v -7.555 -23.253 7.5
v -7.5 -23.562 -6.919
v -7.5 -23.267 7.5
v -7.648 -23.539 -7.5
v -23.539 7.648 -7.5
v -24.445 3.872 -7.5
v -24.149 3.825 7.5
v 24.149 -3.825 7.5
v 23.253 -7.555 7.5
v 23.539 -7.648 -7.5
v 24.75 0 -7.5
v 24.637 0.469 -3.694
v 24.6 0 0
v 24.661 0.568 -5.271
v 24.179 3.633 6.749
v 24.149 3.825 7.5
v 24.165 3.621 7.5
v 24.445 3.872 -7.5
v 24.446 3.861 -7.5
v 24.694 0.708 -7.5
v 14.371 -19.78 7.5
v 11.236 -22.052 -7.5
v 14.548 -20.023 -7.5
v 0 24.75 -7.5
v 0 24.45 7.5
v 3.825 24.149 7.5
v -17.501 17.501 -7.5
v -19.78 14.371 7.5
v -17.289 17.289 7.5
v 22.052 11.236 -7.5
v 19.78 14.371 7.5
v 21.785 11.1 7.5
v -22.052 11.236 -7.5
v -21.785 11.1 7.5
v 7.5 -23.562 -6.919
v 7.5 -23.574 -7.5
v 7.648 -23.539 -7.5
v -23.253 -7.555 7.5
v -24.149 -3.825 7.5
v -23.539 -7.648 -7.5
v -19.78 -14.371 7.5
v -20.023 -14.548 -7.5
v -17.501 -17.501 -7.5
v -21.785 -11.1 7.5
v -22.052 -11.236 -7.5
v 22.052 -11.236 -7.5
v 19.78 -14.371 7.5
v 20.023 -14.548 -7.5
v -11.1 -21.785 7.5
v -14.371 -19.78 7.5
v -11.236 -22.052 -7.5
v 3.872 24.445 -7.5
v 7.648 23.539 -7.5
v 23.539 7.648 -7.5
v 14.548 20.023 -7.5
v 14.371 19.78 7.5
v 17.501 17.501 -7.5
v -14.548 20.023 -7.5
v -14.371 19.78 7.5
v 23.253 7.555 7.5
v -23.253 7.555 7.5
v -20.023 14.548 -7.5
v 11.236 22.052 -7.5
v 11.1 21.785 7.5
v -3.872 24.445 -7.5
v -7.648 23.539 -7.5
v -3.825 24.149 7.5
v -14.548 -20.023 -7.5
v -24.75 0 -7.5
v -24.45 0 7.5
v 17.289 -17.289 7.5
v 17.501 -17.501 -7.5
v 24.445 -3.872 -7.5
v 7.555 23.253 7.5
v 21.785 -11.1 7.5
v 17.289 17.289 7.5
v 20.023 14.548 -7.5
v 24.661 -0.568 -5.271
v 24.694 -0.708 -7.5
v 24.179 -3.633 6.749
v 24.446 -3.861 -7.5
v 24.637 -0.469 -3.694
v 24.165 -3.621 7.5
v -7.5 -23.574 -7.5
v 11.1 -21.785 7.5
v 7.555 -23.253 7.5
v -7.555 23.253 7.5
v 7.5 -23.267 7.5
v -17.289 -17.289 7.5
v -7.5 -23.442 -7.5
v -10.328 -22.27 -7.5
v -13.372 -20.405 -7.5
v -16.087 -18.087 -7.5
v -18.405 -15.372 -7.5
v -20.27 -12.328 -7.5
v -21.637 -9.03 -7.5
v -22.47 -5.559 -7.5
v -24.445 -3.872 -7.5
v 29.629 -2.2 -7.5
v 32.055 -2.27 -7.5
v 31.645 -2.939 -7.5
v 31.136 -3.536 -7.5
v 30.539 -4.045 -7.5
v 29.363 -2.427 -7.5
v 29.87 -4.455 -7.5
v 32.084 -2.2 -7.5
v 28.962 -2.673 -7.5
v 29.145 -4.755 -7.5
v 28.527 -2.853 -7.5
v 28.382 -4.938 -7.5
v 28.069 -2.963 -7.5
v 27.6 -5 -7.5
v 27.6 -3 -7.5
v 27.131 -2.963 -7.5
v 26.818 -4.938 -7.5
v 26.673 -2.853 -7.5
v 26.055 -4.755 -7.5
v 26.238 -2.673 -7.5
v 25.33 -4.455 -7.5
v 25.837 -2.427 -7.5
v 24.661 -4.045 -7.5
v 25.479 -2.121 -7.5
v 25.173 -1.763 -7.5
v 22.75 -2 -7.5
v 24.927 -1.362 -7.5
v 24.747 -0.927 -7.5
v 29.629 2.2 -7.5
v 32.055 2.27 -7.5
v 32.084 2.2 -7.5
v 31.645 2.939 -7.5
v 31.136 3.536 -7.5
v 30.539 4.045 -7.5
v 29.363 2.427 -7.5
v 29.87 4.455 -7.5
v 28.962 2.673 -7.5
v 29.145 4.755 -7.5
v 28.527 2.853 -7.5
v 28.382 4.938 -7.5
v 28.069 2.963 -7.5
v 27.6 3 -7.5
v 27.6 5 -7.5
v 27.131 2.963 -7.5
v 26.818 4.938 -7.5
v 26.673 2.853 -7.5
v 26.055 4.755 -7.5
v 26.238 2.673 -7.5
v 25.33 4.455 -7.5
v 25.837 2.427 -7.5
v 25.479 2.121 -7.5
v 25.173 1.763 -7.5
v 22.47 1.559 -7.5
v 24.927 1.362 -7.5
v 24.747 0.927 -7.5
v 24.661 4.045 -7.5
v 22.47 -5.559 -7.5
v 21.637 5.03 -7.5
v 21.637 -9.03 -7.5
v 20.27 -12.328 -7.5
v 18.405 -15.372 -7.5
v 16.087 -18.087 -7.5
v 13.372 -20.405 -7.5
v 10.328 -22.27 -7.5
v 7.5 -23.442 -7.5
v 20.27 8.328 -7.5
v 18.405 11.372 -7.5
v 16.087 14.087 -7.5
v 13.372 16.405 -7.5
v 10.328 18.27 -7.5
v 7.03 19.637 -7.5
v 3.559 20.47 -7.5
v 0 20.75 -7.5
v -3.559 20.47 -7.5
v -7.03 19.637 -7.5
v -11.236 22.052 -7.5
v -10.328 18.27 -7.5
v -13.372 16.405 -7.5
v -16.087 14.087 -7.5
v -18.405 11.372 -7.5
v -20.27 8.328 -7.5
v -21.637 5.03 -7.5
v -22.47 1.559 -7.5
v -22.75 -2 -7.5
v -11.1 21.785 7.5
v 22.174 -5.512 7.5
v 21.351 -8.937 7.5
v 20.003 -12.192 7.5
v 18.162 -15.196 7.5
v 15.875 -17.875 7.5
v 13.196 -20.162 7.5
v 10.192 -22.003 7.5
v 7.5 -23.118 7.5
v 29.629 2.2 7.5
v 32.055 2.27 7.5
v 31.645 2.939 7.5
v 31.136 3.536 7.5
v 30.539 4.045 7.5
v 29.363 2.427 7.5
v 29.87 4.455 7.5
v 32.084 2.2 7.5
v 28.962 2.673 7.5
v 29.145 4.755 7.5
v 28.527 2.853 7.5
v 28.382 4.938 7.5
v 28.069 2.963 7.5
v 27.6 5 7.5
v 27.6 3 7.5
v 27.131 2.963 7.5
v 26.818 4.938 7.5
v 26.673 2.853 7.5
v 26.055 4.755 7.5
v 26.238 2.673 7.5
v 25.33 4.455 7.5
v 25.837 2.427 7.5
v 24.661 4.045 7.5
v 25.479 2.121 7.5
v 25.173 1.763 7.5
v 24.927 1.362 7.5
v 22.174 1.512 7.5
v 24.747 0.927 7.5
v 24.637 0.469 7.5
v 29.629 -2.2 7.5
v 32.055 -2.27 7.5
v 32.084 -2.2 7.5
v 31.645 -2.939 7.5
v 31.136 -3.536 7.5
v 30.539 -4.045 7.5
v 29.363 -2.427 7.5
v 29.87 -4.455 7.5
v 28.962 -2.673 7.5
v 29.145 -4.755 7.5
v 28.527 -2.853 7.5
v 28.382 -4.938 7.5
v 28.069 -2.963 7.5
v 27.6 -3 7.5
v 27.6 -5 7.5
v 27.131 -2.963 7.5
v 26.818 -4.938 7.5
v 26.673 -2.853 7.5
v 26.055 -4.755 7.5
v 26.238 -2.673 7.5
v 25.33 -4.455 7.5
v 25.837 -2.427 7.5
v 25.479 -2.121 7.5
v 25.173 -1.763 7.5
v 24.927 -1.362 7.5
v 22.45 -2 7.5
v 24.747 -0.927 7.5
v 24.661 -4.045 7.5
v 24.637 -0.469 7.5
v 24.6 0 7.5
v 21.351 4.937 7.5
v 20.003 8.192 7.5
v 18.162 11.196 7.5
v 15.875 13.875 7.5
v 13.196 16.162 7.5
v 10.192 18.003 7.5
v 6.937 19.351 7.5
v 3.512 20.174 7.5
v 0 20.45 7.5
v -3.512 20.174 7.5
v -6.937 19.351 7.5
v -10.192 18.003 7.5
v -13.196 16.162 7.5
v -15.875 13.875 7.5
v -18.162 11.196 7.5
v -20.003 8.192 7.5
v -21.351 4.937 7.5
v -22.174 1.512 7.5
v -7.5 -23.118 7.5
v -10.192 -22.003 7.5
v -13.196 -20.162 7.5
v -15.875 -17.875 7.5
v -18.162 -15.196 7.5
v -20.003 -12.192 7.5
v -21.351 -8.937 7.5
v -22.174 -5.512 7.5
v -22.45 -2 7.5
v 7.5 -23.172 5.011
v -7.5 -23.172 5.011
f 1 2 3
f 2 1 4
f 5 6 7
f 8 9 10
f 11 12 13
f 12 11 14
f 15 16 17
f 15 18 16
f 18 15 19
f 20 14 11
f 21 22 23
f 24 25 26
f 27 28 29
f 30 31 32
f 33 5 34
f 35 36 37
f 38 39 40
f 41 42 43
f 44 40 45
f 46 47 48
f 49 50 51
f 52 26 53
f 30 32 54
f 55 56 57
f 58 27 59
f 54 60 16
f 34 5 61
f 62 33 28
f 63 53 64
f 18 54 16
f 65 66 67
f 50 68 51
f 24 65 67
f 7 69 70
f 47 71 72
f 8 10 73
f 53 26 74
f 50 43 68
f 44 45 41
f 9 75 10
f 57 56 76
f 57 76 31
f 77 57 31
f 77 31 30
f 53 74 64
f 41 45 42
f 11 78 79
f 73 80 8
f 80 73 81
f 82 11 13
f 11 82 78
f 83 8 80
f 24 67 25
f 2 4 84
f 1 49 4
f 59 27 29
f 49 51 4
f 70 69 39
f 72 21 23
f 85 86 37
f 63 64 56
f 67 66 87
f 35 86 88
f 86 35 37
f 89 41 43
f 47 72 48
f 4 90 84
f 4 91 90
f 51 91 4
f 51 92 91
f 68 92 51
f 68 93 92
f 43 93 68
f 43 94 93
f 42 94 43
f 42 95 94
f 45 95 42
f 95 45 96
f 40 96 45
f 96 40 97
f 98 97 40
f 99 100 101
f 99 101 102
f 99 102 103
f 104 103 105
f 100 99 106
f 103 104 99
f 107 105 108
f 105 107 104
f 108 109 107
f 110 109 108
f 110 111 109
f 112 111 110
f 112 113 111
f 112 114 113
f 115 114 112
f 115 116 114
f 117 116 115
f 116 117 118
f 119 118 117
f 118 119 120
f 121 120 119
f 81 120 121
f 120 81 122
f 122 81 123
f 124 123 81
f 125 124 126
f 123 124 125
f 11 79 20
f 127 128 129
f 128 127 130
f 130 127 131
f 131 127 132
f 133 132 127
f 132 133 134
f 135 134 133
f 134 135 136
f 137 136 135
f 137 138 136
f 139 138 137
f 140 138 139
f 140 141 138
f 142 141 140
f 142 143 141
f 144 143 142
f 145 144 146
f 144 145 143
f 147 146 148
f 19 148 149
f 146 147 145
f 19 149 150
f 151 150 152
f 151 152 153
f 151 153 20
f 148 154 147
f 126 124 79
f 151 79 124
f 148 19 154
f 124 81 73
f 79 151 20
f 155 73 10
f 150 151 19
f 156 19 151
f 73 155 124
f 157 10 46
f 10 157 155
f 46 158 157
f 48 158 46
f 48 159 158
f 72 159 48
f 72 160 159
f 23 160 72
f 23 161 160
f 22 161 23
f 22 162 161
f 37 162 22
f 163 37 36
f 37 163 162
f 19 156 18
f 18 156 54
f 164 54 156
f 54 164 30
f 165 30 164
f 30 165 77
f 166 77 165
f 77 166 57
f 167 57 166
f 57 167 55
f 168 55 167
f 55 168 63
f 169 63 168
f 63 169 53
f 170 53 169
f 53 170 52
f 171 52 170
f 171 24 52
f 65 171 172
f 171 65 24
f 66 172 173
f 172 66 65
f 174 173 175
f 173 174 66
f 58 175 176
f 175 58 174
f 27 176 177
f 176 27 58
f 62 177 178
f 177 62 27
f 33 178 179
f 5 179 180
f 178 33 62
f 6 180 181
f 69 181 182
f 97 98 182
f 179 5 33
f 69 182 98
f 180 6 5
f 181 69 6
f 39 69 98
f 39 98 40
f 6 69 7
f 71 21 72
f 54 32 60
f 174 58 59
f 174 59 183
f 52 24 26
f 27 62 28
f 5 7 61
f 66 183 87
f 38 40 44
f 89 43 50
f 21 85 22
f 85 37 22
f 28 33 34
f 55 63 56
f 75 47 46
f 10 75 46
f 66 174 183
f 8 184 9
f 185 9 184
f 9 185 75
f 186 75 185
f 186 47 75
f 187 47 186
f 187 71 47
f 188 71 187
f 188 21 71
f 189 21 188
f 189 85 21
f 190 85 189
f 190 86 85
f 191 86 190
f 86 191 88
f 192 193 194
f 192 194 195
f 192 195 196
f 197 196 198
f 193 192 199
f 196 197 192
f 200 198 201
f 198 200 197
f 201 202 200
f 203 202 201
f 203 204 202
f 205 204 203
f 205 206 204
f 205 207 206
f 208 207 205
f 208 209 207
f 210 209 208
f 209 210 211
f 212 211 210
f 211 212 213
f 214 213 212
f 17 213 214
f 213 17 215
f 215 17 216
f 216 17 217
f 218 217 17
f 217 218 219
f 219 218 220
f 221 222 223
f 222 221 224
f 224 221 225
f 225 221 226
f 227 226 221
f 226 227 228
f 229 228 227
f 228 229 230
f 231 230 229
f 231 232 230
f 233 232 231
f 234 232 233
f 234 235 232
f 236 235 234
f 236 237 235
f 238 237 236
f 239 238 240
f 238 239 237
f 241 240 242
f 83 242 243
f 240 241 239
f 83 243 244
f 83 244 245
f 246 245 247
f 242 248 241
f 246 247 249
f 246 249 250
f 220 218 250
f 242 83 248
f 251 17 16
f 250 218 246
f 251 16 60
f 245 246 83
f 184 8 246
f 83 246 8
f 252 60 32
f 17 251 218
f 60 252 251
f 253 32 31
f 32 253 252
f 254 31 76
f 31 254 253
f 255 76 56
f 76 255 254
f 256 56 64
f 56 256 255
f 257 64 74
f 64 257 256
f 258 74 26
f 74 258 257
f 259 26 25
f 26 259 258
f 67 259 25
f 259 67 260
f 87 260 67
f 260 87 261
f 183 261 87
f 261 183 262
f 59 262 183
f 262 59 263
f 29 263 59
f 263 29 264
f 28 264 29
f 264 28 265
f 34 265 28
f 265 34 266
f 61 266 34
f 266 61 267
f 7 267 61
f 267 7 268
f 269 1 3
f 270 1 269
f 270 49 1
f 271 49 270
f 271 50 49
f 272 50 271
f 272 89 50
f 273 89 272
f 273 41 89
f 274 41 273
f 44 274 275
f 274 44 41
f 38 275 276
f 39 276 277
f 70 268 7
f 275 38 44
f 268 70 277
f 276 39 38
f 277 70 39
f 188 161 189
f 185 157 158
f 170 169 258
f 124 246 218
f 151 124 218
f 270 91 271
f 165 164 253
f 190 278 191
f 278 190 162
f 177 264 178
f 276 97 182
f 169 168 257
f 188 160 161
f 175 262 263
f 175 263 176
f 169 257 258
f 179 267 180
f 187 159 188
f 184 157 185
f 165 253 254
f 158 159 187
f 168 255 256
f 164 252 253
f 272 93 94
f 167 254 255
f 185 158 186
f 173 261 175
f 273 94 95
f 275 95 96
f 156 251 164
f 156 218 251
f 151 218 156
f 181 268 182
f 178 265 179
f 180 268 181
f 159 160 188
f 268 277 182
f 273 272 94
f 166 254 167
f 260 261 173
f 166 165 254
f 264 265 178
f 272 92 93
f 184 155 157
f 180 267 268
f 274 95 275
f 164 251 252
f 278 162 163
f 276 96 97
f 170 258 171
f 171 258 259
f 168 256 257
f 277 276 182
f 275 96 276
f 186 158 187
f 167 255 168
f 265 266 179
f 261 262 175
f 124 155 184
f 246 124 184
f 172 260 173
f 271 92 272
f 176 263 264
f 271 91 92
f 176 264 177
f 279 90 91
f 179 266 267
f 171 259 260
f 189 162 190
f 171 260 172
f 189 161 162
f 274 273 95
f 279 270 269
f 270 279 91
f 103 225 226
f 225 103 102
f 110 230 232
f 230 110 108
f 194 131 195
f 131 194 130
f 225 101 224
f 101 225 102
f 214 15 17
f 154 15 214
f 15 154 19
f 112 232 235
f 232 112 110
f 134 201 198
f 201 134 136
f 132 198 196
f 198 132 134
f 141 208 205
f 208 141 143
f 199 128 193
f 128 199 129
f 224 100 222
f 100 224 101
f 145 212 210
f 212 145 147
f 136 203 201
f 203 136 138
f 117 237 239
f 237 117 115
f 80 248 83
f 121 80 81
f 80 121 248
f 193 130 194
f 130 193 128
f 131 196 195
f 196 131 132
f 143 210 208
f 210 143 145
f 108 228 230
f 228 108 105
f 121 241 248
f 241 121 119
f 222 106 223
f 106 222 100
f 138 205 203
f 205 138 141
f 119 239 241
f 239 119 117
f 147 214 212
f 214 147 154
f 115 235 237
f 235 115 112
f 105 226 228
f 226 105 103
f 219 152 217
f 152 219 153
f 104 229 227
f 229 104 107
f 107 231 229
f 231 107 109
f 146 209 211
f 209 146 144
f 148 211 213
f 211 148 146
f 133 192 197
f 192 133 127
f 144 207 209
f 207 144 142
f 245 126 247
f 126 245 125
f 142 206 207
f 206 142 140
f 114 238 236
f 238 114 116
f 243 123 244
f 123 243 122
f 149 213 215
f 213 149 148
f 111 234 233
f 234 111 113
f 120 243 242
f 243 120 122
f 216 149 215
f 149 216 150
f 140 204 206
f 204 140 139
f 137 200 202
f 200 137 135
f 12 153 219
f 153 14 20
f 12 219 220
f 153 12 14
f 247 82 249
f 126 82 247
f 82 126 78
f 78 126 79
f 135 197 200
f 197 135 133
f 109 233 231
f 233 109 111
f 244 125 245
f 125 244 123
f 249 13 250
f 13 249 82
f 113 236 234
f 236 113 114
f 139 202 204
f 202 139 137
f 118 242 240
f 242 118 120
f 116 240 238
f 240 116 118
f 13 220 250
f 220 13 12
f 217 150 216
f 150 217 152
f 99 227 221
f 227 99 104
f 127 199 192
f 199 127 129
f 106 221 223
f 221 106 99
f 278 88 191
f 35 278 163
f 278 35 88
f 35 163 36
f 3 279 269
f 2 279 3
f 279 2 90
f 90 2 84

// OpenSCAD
e=4; // epaisseur

/*
// flute soprano Yamaha
de2=19.4;// diamètre flute bas
de1=19.6; // diamètre flute haut
de=(de1+de2)/2;
he=12; // largeur pince
da_trou = 0 ;// angle rotation trou
l_ouevrture_pince=10;
*/

/*
// flute alto aulos
de2=25.6;// diamètre flute bas
de1=25.8; // diamètre flute haut
de=(de1+de2)/2;
he=15; // largeur pince
da_trou = 0;  // angle rotation trou
l_ouevrture_pince=10;
*/

/*
// flute tenor aulos
de2=39.6;// diamètre flute bas
de1=38.3; // diamètre flute haut
de=(de1+de2)/2;
he=15; // largeur pince
da_trou = 0;  // angle rotation trou
l_ouevrture_pince=10;
*/

// flute basse aulos
de2=44.9;// diamètre flute bas
de1=45.5; // diamètre flute haut
de=(de1+de2)/2;
he=15; // largeur pince
da_trou = 0;  // angle rotation trou
l_ouevrture_pince=15;

dmicro=6;
douverture=dmicro-1.6;
$fn=40;
module serre_micro()
{
    translate([de/2+e/2+dmicro/2,0,1])
        union()
        {
            difference()
            {
                cylinder(d=dmicro+2*e,h=he,center=true);
                cylinder(d=dmicro+e,h=he,center=true);
                translate([-6,0,0])
                        cube([5,de,he],center=true);        
            }
            difference()
            {
                translate([dmicro/2,0,0])
                    cube([e,douverture-0.5,he],center=true);
                cylinder(d=dmicro,h=he,center=true);
            }
        }
}
module porte_micro()
{
    difference()
    {
        union()
        {
            difference()
            {
                // tube flute
                cylinder(d1=de1+e,d2=de2+e,h=he,center=true); 
                // extrusion tube flute
                translate([0,-e/2,0])
                    cylinder(d1=de1,d2=de2,h=he,center=true); 
            }
            translate([de/2+e/2+dmicro/2,0,0])
            {
                difference()
                {
                    // tube micro
                    cylinder(d=dmicro+e,h=he,center=true); 
                    // extrusion tube micro
                    cylinder(d=dmicro,h=he,center=true);
                    // extrusion passage micro
                    translate([dmicro-e/2,0,0])
                        cube([1.5*e,douverture,he],center=true); 
                }
            }
        }
        rotate([0,0,da_trou])
            translate([0,-de+5,0])
                cube([l_ouevrture_pince,2*de,he],center=true);
    }
}
porte_micro();
*serre_micro();
